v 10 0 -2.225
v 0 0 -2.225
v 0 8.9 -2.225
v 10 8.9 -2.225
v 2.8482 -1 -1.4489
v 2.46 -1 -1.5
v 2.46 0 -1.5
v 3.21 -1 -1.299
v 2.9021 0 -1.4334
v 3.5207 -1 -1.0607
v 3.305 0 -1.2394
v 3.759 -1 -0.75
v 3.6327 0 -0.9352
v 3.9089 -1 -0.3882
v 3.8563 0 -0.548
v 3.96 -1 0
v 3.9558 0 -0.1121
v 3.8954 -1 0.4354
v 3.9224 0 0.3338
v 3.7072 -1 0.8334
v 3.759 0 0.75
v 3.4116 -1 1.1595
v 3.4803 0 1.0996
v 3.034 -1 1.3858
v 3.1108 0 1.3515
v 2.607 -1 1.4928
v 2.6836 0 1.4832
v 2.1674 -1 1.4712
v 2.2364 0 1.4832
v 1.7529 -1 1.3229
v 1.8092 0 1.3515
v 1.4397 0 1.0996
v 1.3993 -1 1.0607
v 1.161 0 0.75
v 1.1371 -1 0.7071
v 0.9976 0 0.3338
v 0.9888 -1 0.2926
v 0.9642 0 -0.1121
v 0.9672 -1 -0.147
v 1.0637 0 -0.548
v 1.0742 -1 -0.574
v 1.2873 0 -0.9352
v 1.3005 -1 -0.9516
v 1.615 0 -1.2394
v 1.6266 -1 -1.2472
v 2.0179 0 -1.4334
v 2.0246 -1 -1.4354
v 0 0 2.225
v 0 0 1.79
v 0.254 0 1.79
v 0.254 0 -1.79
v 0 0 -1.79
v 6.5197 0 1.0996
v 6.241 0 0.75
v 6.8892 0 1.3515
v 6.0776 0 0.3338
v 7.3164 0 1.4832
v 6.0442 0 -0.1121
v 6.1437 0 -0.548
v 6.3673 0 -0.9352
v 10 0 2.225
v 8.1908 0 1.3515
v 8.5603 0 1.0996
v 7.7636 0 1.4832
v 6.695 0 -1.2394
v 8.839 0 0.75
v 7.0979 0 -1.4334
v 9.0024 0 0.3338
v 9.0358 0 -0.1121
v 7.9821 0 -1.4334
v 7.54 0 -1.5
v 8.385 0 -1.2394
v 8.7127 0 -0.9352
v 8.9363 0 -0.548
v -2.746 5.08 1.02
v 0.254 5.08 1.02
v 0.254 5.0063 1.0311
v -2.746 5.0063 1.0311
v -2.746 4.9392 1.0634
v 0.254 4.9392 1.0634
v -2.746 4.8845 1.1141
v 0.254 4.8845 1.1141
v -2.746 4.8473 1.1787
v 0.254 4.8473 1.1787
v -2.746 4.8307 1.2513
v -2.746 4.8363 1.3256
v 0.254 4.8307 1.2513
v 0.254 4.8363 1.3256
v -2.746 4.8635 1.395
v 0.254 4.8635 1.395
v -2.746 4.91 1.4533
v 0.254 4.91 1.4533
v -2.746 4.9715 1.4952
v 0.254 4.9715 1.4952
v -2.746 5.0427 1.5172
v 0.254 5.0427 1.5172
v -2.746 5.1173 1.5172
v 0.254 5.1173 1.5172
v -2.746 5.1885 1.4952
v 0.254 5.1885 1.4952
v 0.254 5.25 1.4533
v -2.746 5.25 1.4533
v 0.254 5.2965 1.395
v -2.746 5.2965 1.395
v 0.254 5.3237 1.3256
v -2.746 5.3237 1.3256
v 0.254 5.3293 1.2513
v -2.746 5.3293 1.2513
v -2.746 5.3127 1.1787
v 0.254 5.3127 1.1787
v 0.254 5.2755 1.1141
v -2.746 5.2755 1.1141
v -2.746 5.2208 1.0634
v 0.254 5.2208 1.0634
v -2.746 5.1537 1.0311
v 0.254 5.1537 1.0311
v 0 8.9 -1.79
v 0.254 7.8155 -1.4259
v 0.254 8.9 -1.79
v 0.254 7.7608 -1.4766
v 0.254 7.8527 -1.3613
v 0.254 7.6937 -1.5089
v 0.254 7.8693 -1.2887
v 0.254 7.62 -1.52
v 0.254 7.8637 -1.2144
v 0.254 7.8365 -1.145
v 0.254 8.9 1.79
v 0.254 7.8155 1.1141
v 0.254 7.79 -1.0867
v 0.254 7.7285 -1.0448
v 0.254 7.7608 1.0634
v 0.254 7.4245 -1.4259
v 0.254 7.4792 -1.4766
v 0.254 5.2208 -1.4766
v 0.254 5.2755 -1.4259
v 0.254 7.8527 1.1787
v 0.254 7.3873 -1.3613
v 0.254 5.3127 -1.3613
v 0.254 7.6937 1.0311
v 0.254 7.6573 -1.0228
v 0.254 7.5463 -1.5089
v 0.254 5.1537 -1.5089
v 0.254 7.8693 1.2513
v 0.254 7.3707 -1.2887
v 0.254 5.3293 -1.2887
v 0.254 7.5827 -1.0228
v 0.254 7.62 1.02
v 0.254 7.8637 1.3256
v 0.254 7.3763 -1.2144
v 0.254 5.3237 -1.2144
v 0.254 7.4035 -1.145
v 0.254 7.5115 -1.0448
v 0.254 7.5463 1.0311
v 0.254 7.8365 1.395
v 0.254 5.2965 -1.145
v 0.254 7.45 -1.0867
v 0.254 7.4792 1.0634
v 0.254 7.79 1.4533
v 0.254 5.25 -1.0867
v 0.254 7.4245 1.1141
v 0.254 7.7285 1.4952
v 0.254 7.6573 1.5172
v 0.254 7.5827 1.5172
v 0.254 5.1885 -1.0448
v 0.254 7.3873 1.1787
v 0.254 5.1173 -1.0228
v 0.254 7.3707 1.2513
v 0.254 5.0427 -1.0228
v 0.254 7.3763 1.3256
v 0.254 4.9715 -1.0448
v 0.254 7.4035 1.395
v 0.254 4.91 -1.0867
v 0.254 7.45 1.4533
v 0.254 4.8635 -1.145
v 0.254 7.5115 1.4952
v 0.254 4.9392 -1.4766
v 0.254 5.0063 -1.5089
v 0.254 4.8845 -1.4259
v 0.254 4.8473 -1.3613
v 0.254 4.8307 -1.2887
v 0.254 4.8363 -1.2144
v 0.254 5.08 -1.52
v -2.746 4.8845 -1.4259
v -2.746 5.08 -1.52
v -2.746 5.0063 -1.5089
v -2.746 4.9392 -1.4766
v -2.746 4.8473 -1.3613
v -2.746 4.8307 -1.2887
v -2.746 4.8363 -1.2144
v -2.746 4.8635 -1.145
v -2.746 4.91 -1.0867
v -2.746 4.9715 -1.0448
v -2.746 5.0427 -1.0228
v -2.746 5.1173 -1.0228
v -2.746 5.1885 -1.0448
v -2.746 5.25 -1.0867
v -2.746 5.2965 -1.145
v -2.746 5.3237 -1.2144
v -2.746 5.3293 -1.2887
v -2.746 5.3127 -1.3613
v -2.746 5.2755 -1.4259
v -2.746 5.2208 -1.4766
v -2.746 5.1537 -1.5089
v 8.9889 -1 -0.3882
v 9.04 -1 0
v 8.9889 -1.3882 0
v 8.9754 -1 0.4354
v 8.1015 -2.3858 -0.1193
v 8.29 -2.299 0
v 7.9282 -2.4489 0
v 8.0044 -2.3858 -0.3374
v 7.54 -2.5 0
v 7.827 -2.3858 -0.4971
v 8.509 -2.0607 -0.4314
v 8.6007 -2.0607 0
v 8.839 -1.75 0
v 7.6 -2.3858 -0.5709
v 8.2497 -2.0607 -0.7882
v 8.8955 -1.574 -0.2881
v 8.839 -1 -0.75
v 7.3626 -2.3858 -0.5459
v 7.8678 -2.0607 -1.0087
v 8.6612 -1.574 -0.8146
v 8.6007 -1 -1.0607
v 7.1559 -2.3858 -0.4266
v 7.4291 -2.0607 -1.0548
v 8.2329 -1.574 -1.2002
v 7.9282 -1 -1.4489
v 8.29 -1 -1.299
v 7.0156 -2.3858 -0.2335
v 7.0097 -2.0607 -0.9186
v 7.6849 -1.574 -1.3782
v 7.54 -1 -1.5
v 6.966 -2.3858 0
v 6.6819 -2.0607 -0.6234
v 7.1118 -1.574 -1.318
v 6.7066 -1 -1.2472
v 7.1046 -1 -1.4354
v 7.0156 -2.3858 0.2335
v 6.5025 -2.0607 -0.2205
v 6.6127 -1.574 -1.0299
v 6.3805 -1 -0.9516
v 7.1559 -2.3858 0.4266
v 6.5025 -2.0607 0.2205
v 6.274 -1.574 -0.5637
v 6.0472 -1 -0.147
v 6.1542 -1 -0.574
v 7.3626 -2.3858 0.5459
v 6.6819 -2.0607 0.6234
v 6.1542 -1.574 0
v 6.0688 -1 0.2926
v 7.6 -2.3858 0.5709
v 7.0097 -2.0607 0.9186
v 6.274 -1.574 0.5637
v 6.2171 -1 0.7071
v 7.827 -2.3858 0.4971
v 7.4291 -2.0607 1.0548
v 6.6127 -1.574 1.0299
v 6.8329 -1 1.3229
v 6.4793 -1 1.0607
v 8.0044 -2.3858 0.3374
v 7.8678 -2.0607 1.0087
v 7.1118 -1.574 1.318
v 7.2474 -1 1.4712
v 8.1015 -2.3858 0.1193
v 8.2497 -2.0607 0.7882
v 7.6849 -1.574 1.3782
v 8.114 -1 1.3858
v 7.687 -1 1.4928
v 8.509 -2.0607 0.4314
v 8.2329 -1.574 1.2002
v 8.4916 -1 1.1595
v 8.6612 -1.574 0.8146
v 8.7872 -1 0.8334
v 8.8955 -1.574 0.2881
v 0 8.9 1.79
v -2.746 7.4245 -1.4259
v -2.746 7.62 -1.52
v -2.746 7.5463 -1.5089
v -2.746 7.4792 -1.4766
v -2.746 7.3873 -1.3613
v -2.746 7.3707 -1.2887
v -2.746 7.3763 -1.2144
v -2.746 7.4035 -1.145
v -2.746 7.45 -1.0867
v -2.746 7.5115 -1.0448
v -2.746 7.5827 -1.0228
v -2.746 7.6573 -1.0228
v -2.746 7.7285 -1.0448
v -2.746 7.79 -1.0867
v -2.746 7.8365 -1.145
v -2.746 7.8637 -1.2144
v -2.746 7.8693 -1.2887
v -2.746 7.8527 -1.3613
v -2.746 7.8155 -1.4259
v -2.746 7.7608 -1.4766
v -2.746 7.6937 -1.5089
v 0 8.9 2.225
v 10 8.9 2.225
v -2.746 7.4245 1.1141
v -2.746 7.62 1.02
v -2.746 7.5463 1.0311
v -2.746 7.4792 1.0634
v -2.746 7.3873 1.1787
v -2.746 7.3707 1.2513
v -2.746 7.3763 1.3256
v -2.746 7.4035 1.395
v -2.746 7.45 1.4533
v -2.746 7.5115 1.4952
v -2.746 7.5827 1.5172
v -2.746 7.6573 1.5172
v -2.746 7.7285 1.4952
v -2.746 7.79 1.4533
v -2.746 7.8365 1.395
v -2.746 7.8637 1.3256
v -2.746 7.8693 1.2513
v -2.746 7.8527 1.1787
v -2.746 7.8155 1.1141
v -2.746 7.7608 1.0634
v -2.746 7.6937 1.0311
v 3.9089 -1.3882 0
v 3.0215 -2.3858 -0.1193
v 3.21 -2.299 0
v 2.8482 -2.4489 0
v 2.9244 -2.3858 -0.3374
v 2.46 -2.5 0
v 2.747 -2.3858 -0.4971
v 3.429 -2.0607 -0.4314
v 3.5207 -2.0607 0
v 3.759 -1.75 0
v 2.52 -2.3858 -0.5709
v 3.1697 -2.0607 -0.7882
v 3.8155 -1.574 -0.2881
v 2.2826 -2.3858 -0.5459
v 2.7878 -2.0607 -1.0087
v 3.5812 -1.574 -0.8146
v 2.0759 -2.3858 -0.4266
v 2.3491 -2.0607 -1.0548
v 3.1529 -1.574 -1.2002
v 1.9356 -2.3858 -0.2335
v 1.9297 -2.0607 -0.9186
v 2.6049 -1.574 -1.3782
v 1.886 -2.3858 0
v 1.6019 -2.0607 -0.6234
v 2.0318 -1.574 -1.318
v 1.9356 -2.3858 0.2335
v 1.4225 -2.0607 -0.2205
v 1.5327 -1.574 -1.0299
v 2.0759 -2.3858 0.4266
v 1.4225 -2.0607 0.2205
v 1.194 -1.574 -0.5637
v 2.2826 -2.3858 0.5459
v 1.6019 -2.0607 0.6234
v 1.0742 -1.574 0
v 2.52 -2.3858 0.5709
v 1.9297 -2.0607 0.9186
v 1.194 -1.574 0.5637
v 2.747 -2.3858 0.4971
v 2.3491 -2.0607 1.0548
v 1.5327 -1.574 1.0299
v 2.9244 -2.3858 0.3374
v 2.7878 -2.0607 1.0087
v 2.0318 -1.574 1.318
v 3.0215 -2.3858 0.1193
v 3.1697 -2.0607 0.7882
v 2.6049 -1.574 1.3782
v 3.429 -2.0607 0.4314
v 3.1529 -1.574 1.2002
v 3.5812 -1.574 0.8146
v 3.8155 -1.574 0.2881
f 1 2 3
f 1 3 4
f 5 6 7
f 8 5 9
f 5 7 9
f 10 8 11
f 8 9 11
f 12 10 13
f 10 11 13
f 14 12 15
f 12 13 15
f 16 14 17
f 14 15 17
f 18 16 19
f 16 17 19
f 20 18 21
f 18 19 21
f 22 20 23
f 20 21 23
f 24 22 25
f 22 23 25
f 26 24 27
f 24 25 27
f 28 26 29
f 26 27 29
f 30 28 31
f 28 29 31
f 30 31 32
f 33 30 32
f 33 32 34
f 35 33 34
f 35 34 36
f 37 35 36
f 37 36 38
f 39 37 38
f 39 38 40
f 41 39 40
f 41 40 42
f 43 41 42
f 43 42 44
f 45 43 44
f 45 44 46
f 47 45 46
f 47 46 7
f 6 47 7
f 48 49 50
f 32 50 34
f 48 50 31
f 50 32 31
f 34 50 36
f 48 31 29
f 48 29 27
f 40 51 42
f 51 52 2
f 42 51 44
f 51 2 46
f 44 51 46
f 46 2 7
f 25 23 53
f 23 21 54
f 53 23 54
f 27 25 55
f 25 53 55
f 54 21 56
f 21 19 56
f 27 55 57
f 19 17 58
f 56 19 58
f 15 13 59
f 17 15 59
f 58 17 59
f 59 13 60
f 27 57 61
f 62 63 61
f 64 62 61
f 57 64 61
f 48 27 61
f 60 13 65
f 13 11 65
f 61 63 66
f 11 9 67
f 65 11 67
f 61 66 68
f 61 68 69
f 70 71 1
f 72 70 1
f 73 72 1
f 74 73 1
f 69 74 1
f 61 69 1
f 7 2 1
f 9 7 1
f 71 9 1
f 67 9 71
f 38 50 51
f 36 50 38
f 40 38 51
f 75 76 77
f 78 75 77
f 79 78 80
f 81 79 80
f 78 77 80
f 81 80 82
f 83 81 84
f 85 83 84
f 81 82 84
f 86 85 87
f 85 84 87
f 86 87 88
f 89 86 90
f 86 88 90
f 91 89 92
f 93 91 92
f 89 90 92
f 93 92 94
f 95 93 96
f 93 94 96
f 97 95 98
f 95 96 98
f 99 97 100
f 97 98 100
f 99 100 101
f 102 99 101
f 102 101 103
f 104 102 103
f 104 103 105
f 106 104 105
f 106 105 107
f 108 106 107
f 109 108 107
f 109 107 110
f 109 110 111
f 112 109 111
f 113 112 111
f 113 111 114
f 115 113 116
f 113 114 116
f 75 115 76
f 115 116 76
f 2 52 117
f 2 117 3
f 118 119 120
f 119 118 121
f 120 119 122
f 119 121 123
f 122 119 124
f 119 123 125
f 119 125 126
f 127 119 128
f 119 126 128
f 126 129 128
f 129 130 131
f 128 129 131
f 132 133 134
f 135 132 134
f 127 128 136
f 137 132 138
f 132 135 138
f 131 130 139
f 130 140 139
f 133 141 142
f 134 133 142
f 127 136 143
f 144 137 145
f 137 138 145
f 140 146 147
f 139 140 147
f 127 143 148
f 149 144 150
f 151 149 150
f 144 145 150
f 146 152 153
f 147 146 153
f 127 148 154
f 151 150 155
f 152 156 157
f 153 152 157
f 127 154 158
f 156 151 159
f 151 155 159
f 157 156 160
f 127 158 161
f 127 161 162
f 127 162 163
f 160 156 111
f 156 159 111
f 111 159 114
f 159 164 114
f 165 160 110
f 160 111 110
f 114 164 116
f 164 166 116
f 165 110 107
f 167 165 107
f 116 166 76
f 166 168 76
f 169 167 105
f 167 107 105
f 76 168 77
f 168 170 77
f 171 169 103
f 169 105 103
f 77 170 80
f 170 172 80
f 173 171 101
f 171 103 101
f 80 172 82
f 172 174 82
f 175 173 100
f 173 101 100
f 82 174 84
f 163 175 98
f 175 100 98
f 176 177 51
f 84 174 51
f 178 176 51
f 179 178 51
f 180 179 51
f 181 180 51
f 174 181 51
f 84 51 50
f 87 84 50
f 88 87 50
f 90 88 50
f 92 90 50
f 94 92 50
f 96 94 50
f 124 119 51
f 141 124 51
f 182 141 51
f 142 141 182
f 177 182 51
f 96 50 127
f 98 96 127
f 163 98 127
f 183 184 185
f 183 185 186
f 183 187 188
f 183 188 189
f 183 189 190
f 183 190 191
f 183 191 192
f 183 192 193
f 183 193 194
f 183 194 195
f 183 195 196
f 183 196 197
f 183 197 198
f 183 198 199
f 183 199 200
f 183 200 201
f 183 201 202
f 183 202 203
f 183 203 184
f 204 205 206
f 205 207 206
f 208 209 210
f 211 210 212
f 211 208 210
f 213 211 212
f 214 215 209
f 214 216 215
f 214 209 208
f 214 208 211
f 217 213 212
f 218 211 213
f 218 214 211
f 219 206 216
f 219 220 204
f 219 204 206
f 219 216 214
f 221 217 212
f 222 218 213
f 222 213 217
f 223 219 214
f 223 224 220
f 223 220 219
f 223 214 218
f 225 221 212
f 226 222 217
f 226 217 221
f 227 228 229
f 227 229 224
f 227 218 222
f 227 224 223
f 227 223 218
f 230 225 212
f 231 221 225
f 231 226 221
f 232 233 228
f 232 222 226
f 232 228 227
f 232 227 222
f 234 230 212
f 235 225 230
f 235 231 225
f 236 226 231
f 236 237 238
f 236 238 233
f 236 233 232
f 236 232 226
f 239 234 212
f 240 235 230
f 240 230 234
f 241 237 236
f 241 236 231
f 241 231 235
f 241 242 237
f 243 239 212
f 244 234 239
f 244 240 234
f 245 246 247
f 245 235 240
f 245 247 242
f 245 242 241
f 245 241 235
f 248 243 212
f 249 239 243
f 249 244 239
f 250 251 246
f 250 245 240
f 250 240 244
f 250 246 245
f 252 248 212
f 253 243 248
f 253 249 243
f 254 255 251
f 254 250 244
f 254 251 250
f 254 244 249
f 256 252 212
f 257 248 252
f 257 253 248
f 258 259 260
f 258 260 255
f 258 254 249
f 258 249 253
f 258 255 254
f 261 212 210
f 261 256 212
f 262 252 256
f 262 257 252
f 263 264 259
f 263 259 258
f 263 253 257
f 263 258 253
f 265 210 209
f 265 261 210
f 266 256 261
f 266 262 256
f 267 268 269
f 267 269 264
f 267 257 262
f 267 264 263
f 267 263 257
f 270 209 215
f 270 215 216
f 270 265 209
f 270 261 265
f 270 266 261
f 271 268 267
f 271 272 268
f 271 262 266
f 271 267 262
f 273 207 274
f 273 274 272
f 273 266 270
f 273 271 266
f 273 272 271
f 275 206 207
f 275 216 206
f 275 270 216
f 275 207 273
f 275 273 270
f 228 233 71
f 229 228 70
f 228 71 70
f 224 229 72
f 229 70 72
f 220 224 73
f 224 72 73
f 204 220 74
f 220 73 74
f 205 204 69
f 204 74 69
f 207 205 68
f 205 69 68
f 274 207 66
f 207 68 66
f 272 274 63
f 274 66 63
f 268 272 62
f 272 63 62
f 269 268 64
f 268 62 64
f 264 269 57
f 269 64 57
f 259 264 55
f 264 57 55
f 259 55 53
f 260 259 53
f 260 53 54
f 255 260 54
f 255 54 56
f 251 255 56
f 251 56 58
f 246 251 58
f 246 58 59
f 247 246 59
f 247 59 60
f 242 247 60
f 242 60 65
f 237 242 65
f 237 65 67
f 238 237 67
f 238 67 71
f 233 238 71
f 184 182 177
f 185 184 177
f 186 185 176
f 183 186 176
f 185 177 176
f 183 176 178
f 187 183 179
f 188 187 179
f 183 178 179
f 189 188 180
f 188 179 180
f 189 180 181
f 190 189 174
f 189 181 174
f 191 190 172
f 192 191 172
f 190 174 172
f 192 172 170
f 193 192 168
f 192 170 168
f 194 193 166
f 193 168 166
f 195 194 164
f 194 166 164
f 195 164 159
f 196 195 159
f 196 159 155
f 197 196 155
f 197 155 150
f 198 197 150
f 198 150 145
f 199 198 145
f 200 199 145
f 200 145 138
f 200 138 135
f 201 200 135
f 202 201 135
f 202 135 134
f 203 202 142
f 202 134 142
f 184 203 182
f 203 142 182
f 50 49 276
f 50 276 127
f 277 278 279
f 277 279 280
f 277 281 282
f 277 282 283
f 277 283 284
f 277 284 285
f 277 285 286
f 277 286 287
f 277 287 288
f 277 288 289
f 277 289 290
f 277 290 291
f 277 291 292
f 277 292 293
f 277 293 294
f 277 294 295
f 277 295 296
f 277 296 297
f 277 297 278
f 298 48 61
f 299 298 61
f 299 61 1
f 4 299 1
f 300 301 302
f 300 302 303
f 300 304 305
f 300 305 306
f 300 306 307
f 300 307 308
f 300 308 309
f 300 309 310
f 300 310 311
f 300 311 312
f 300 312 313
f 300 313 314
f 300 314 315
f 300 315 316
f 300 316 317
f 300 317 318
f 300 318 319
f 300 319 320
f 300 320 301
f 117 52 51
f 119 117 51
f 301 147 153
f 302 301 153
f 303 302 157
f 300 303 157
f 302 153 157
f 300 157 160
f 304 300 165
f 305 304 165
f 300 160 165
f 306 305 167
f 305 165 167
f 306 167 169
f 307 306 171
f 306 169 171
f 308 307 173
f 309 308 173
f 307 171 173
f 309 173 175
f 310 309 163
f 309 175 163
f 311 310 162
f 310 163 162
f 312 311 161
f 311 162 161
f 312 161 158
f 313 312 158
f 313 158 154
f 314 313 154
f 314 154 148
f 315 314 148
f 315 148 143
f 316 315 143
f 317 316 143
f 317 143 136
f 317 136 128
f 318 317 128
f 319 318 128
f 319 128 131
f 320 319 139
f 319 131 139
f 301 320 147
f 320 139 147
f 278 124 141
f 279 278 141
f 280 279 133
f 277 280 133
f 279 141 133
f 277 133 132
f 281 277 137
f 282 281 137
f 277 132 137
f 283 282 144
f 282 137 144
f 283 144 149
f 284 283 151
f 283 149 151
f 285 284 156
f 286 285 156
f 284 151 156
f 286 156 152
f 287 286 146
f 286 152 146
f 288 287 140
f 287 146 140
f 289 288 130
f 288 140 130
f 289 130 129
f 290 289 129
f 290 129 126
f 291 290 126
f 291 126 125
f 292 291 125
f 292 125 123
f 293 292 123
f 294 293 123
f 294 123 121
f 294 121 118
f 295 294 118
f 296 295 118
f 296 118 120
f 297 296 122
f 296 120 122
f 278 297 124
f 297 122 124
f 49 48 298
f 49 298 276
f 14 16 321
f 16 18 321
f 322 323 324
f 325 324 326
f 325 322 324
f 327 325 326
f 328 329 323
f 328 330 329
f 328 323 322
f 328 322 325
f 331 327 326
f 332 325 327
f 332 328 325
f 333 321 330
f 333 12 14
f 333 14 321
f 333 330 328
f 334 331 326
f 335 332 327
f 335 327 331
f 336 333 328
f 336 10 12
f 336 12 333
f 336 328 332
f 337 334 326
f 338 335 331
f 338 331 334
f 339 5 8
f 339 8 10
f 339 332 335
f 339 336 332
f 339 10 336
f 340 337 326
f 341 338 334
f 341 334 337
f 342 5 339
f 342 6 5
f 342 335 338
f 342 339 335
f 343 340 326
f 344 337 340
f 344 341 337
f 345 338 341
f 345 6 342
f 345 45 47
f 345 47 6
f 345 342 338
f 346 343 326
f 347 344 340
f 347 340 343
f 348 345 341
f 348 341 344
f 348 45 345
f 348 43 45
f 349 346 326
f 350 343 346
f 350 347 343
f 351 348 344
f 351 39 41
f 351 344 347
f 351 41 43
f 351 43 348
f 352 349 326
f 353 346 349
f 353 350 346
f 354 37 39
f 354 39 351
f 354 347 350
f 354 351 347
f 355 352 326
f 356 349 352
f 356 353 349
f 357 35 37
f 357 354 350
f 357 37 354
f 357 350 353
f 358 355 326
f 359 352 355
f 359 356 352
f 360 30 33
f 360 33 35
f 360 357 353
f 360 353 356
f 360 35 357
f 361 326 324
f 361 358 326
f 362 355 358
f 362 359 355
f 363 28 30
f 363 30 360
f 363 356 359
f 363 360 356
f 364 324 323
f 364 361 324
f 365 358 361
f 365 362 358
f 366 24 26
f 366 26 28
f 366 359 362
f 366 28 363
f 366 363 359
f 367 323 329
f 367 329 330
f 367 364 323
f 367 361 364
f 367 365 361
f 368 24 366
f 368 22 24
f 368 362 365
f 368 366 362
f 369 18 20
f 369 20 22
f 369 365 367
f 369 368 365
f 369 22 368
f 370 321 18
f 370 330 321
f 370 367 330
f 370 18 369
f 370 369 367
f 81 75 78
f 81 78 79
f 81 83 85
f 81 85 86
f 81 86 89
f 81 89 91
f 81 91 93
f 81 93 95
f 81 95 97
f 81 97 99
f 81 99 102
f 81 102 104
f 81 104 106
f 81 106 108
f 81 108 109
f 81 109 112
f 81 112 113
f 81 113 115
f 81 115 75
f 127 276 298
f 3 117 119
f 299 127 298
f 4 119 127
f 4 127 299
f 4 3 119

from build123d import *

# Parameters (mm, degrees)
SKETCH_1_W          = 10
SKETCH_1_H          = 4.45
EXTRUDE_1_DEPTH     = 8.9
SKETCH_2_R          = 1.5
EXTRUDE_2_DEPTH     = 1
CUT_EXTRUDE_1_REACH = 15.571
SKETCH_4_W          = 0.254
SKETCH_4_H          = 3.58
SKETCH_3_R          = 0.25
EXTRUDE_3_DEPTH     = 3


# Read off the part's stored shape, not the designer's step: 圆顶1, 圆顶2
with BuildPart() as part:
    # 草图1 → 凸台-拉伸1 (new body)
    with BuildSketch(Plane(origin=(0, 0, 0), x_dir=(1, 0, 0), z_dir=(0, 1, 0))):
        with Locations((5, 0)):
            Rectangle(SKETCH_1_W, SKETCH_1_H)
    extrude(amount=EXTRUDE_1_DEPTH)

    # 草图2 → 凸台-拉伸2 (add)
    with BuildSketch(Plane.XZ):
        with Locations(Location((7.54, 0, 0), (0, 0, 270))):
            Circle(SKETCH_2_R)
        with Locations(Location((2.46, 0, 0), (0, 0, 270))):
            Circle(SKETCH_2_R)
    extrude(amount=EXTRUDE_2_DEPTH)

    # 圆顶1 outline → 圆顶1 (revolve)
    with BuildSketch(Plane(origin=(7.54, 0, 0), x_dir=(1, 0, 0), z_dir=(0, 0, 1))):
        with BuildLine():
            Line((0, -0.999999998), (0, -2.5))
            ThreePointArc((0, -2.5), (1.060660172, -2.060660171), (1.5, -0.999999998))
            Line((1.5, -0.999999998), (0, -0.999999998))
        make_face()
    revolve(axis=Axis((7.54, 0, 0), (0, 1, 0)))

    # 圆顶2 outline → 圆顶2 (revolve)
    with BuildSketch(Plane(origin=(2.46, 0, 0), x_dir=(1, 0, 0), z_dir=(0, 0, 1))):
        with BuildLine():
            Line((0, -0.999999998), (0, -2.5))
            ThreePointArc((0, -2.5), (1.060660172, -2.060660171), (1.5, -0.999999998))
            Line((1.5, -0.999999998), (0, -0.999999998))
        make_face()
    revolve(axis=Axis((2.46, 0, 0), (0, 1, 0)))

    # 草图4 → 切除-拉伸1 (cut, up to next)
    with BuildSketch(Plane.XZ, mode=Mode.PRIVATE) as cut_extrude_1_sk1:
        with Locations((0.127, 0)):
            Rectangle(SKETCH_4_W, SKETCH_4_H)
    cut_extrude_1_tool1 = extrude(cut_extrude_1_sk1.sketch, amount=-CUT_EXTRUDE_1_REACH, mode=Mode.PRIVATE) & part.part
    add(cut_extrude_1_tool1.solids().sort_by_distance((0.127, 0, 0))[0], mode=Mode.SUBTRACT)

    # 草图3 → 凸台-拉伸3 (add)
    with BuildSketch(Plane.ZY.offset(-0.254)):
        with Locations(Location((-1.27, 5.08, 0), (0, 0, 180))):
            Circle(SKETCH_3_R)
        with Locations(Location((-1.27, 7.62, 0), (0, 0, 180))):
            Circle(SKETCH_3_R)
        with Locations(Location((1.27, 7.62, 0), (0, 0, 180))):
            Circle(SKETCH_3_R)
        with Locations(Location((1.27, 5.08, 0), (0, 0, 180))):
            Circle(SKETCH_3_R)
    extrude(amount=EXTRUDE_3_DEPTH)


solid = part.part
